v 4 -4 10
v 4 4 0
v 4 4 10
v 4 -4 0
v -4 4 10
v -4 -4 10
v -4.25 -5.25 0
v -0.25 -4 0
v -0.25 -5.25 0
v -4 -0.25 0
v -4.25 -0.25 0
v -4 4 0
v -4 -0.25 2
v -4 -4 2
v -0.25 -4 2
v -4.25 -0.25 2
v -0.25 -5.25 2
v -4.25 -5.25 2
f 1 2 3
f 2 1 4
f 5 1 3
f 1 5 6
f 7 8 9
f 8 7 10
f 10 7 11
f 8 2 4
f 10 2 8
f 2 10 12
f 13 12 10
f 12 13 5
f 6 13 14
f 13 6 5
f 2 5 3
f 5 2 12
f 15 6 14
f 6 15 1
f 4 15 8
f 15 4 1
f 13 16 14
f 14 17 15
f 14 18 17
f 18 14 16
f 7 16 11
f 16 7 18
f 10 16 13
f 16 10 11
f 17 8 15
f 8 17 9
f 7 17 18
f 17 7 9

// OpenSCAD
translate([0, 0, 5]) color([0,1,0,0.9]) cube([8, 8, 10], center=true);
translate([-0.5, -0.5, 1]) color([1,0,0]) cube([0.5, 0.5, 2], center=true);
translate([-1.0, -0.5, 1]) color([1,0,0]) cube([0.5, 0.5, 2], center=true);
translate([-1.5, -0.5, 1]) color([1,0,0]) cube([0.5, 0.5, 2], center=true);
translate([-2.0, -0.5, 1]) color([1,0,0]) cube([0.5, 0.5, 2], center=true);
translate([-2.5, -0.5, 1]) color([1,0,0]) cube([0.5, 0.5, 2], center=true);
translate([-3.0, -0.5, 1]) color([1,0,0]) cube([0.5, 0.5, 2], center=true);
translate([-3.5, -0.5, 1]) color([1,0,0]) cube([0.5, 0.5, 2], center=true);
translate([-4.0, -0.5, 1]) color([1,0,0]) cube([0.5, 0.5, 2], center=true);
translate([-0.5, -1.0, 1]) color([1,0,0]) cube([0.5, 0.5, 2], center=true);
translate([-1.0, -1.0, 1]) color([1,0,0]) cube([0.5, 0.5, 2], center=true);
translate([-1.5, -1.0, 1]) color([1,0,0]) cube([0.5, 0.5, 2], center=true);
translate([-2.0, -1.0, 1]) color([1,0,0]) cube([0.5, 0.5, 2], center=true);
translate([-2.5, -1.0, 1]) color([1,0,0]) cube([0.5, 0.5, 2], center=true);
translate([-3.0, -1.0, 1]) color([1,0,0]) cube([0.5, 0.5, 2], center=true);
translate([-3.5, -1.0, 1]) color([1,0,0]) cube([0.5, 0.5, 2], center=true);
translate([-4.0, -1.0, 1]) color([1,0,0]) cube([0.5, 0.5, 2], center=true);
translate([-0.5, -1.5, 1]) color([1,0,0]) cube([0.5, 0.5, 2], center=true);
translate([-1.0, -1.5, 1]) color([1,0,0]) cube([0.5, 0.5, 2], center=true);
translate([-1.5, -1.5, 1]) color([1,0,0]) cube([0.5, 0.5, 2], center=true);
translate([-2.0, -1.5, 1]) color([1,0,0]) cube([0.5, 0.5, 2], center=true);
translate([-2.5, -1.5, 1]) color([1,0,0]) cube([0.5, 0.5, 2], center=true);
translate([-3.0, -1.5, 1]) color([1,0,0]) cube([0.5, 0.5, 2], center=true);
translate([-3.5, -1.5, 1]) color([1,0,0]) cube([0.5, 0.5, 2], center=true);
translate([-4.0, -1.5, 1]) color([1,0,0]) cube([0.5, 0.5, 2], center=true);
translate([-0.5, -2.0, 1]) color([1,0,0]) cube([0.5, 0.5, 2], center=true);
translate([-1.0, -2.0, 1]) color([1,0,0]) cube([0.5, 0.5, 2], center=true);
translate([-1.5, -2.0, 1]) color([1,0,0]) cube([0.5, 0.5, 2], center=true);
translate([-2.0, -2.0, 1]) color([1,0,0]) cube([0.5, 0.5, 2], center=true);
translate([-2.5, -2.0, 1]) color([1,0,0]) cube([0.5, 0.5, 2], center=true);
translate([-3.0, -2.0, 1]) color([1,0,0]) cube([0.5, 0.5, 2], center=true);
translate([-3.5, -2.0, 1]) color([1,0,0]) cube([0.5, 0.5, 2], center=true);
translate([-4.0, -2.0, 1]) color([1,0,0]) cube([0.5, 0.5, 2], center=true);
translate([-0.5, -2.5, 1]) color([1,0,0]) cube([0.5, 0.5, 2], center=true);
translate([-1.0, -2.5, 1]) color([1,0,0]) cube([0.5, 0.5, 2], center=true);
translate([-1.5, -2.5, 1]) color([1,0,0]) cube([0.5, 0.5, 2], center=true);
translate([-2.0, -2.5, 1]) color([1,0,0]) cube([0.5, 0.5, 2], center=true);
translate([-2.5, -2.5, 1]) color([1,0,0]) cube([0.5, 0.5, 2], center=true);
translate([-3.0, -2.5, 1]) color([1,0,0]) cube([0.5, 0.5, 2], center=true);
translate([-3.5, -2.5, 1]) color([1,0,0]) cube([0.5, 0.5, 2], center=true);
translate([-4.0, -2.5, 1]) color([1,0,0]) cube([0.5, 0.5, 2], center=true);
translate([-0.5, -3.0, 1]) color([1,0,0]) cube([0.5, 0.5, 2], center=true);
translate([-1.0, -3.0, 1]) color([1,0,0]) cube([0.5, 0.5, 2], center=true);
translate([-1.5, -3.0, 1]) color([1,0,0]) cube([0.5, 0.5, 2], center=true);
translate([-2.0, -3.0, 1]) color([1,0,0]) cube([0.5, 0.5, 2], center=true);
translate([-2.5, -3.0, 1]) color([1,0,0]) cube([0.5, 0.5, 2], center=true);
translate([-3.0, -3.0, 1]) color([1,0,0]) cube([0.5, 0.5, 2], center=true);
translate([-3.5, -3.0, 1]) color([1,0,0]) cube([0.5, 0.5, 2], center=true);
translate([-4.0, -3.0, 1]) color([1,0,0]) cube([0.5, 0.5, 2], center=true);
translate([-0.5, -3.5, 1]) color([1,0,0]) cube([0.5, 0.5, 2], center=true);
translate([-1.0, -3.5, 1]) color([1,0,0]) cube([0.5, 0.5, 2], center=true);
translate([-1.5, -3.5, 1]) color([1,0,0]) cube([0.5, 0.5, 2], center=true);
translate([-2.0, -3.5, 1]) color([1,0,0]) cube([0.5, 0.5, 2], center=true);
translate([-2.5, -3.5, 1]) color([1,0,0]) cube([0.5, 0.5, 2], center=true);
translate([-3.0, -3.5, 1]) color([1,0,0]) cube([0.5, 0.5, 2], center=true);
translate([-3.5, -3.5, 1]) color([1,0,0]) cube([0.5, 0.5, 2], center=true);
translate([-4.0, -3.5, 1]) color([1,0,0]) cube([0.5, 0.5, 2], center=true);
translate([-0.5, -4.0, 1]) color([1,0,0]) cube([0.5, 0.5, 2], center=true);
translate([-1.0, -4.0, 1]) color([1,0,0]) cube([0.5, 0.5, 2], center=true);
translate([-1.5, -4.0, 1]) color([1,0,0]) cube([0.5, 0.5, 2], center=true);
translate([-2.0, -4.0, 1]) color([1,0,0]) cube([0.5, 0.5, 2], center=true);
translate([-2.5, -4.0, 1]) color([1,0,0]) cube([0.5, 0.5, 2], center=true);
translate([-3.0, -4.0, 1]) color([1,0,0]) cube([0.5, 0.5, 2], center=true);
translate([-3.5, -4.0, 1]) color([1,0,0]) cube([0.5, 0.5, 2], center=true);
translate([-4.0, -4.0, 1]) color([1,0,0]) cube([0.5, 0.5, 2], center=true);
translate([-0.5, -4.5, 1]) color([1,0,0]) cube([0.5, 0.5, 2], center=true);
translate([-1.0, -4.5, 1]) color([1,0,0]) cube([0.5, 0.5, 2], center=true);
translate([-1.5, -4.5, 1]) color([1,0,0]) cube([0.5, 0.5, 2], center=true);
translate([-2.0, -4.5, 1]) color([1,0,0]) cube([0.5, 0.5, 2], center=true);
translate([-2.5, -4.5, 1]) color([1,0,0]) cube([0.5, 0.5, 2], center=true);
translate([-3.0, -4.5, 1]) color([1,0,0]) cube([0.5, 0.5, 2], center=true);
translate([-3.5, -4.5, 1]) color([1,0,0]) cube([0.5, 0.5, 2], center=true);
translate([-4.0, -4.5, 1]) color([1,0,0]) cube([0.5, 0.5, 2], center=true);
translate([-0.5, -5.0, 1]) color([1,0,0]) cube([0.5, 0.5, 2], center=true);
translate([-1.0, -5.0, 1]) color([1,0,0]) cube([0.5, 0.5, 2], center=true);
translate([-1.5, -5.0, 1]) color([1,0,0]) cube([0.5, 0.5, 2], center=true);
translate([-2.0, -5.0, 1]) color([1,0,0]) cube([0.5, 0.5, 2], center=true);
translate([-2.5, -5.0, 1]) color([1,0,0]) cube([0.5, 0.5, 2], center=true);
translate([-3.0, -5.0, 1]) color([1,0,0]) cube([0.5, 0.5, 2], center=true);
translate([-3.5, -5.0, 1]) color([1,0,0]) cube([0.5, 0.5, 2], center=true);
translate([-4.0, -5.0, 1]) color([1,0,0]) cube([0.5, 0.5, 2], center=true);
